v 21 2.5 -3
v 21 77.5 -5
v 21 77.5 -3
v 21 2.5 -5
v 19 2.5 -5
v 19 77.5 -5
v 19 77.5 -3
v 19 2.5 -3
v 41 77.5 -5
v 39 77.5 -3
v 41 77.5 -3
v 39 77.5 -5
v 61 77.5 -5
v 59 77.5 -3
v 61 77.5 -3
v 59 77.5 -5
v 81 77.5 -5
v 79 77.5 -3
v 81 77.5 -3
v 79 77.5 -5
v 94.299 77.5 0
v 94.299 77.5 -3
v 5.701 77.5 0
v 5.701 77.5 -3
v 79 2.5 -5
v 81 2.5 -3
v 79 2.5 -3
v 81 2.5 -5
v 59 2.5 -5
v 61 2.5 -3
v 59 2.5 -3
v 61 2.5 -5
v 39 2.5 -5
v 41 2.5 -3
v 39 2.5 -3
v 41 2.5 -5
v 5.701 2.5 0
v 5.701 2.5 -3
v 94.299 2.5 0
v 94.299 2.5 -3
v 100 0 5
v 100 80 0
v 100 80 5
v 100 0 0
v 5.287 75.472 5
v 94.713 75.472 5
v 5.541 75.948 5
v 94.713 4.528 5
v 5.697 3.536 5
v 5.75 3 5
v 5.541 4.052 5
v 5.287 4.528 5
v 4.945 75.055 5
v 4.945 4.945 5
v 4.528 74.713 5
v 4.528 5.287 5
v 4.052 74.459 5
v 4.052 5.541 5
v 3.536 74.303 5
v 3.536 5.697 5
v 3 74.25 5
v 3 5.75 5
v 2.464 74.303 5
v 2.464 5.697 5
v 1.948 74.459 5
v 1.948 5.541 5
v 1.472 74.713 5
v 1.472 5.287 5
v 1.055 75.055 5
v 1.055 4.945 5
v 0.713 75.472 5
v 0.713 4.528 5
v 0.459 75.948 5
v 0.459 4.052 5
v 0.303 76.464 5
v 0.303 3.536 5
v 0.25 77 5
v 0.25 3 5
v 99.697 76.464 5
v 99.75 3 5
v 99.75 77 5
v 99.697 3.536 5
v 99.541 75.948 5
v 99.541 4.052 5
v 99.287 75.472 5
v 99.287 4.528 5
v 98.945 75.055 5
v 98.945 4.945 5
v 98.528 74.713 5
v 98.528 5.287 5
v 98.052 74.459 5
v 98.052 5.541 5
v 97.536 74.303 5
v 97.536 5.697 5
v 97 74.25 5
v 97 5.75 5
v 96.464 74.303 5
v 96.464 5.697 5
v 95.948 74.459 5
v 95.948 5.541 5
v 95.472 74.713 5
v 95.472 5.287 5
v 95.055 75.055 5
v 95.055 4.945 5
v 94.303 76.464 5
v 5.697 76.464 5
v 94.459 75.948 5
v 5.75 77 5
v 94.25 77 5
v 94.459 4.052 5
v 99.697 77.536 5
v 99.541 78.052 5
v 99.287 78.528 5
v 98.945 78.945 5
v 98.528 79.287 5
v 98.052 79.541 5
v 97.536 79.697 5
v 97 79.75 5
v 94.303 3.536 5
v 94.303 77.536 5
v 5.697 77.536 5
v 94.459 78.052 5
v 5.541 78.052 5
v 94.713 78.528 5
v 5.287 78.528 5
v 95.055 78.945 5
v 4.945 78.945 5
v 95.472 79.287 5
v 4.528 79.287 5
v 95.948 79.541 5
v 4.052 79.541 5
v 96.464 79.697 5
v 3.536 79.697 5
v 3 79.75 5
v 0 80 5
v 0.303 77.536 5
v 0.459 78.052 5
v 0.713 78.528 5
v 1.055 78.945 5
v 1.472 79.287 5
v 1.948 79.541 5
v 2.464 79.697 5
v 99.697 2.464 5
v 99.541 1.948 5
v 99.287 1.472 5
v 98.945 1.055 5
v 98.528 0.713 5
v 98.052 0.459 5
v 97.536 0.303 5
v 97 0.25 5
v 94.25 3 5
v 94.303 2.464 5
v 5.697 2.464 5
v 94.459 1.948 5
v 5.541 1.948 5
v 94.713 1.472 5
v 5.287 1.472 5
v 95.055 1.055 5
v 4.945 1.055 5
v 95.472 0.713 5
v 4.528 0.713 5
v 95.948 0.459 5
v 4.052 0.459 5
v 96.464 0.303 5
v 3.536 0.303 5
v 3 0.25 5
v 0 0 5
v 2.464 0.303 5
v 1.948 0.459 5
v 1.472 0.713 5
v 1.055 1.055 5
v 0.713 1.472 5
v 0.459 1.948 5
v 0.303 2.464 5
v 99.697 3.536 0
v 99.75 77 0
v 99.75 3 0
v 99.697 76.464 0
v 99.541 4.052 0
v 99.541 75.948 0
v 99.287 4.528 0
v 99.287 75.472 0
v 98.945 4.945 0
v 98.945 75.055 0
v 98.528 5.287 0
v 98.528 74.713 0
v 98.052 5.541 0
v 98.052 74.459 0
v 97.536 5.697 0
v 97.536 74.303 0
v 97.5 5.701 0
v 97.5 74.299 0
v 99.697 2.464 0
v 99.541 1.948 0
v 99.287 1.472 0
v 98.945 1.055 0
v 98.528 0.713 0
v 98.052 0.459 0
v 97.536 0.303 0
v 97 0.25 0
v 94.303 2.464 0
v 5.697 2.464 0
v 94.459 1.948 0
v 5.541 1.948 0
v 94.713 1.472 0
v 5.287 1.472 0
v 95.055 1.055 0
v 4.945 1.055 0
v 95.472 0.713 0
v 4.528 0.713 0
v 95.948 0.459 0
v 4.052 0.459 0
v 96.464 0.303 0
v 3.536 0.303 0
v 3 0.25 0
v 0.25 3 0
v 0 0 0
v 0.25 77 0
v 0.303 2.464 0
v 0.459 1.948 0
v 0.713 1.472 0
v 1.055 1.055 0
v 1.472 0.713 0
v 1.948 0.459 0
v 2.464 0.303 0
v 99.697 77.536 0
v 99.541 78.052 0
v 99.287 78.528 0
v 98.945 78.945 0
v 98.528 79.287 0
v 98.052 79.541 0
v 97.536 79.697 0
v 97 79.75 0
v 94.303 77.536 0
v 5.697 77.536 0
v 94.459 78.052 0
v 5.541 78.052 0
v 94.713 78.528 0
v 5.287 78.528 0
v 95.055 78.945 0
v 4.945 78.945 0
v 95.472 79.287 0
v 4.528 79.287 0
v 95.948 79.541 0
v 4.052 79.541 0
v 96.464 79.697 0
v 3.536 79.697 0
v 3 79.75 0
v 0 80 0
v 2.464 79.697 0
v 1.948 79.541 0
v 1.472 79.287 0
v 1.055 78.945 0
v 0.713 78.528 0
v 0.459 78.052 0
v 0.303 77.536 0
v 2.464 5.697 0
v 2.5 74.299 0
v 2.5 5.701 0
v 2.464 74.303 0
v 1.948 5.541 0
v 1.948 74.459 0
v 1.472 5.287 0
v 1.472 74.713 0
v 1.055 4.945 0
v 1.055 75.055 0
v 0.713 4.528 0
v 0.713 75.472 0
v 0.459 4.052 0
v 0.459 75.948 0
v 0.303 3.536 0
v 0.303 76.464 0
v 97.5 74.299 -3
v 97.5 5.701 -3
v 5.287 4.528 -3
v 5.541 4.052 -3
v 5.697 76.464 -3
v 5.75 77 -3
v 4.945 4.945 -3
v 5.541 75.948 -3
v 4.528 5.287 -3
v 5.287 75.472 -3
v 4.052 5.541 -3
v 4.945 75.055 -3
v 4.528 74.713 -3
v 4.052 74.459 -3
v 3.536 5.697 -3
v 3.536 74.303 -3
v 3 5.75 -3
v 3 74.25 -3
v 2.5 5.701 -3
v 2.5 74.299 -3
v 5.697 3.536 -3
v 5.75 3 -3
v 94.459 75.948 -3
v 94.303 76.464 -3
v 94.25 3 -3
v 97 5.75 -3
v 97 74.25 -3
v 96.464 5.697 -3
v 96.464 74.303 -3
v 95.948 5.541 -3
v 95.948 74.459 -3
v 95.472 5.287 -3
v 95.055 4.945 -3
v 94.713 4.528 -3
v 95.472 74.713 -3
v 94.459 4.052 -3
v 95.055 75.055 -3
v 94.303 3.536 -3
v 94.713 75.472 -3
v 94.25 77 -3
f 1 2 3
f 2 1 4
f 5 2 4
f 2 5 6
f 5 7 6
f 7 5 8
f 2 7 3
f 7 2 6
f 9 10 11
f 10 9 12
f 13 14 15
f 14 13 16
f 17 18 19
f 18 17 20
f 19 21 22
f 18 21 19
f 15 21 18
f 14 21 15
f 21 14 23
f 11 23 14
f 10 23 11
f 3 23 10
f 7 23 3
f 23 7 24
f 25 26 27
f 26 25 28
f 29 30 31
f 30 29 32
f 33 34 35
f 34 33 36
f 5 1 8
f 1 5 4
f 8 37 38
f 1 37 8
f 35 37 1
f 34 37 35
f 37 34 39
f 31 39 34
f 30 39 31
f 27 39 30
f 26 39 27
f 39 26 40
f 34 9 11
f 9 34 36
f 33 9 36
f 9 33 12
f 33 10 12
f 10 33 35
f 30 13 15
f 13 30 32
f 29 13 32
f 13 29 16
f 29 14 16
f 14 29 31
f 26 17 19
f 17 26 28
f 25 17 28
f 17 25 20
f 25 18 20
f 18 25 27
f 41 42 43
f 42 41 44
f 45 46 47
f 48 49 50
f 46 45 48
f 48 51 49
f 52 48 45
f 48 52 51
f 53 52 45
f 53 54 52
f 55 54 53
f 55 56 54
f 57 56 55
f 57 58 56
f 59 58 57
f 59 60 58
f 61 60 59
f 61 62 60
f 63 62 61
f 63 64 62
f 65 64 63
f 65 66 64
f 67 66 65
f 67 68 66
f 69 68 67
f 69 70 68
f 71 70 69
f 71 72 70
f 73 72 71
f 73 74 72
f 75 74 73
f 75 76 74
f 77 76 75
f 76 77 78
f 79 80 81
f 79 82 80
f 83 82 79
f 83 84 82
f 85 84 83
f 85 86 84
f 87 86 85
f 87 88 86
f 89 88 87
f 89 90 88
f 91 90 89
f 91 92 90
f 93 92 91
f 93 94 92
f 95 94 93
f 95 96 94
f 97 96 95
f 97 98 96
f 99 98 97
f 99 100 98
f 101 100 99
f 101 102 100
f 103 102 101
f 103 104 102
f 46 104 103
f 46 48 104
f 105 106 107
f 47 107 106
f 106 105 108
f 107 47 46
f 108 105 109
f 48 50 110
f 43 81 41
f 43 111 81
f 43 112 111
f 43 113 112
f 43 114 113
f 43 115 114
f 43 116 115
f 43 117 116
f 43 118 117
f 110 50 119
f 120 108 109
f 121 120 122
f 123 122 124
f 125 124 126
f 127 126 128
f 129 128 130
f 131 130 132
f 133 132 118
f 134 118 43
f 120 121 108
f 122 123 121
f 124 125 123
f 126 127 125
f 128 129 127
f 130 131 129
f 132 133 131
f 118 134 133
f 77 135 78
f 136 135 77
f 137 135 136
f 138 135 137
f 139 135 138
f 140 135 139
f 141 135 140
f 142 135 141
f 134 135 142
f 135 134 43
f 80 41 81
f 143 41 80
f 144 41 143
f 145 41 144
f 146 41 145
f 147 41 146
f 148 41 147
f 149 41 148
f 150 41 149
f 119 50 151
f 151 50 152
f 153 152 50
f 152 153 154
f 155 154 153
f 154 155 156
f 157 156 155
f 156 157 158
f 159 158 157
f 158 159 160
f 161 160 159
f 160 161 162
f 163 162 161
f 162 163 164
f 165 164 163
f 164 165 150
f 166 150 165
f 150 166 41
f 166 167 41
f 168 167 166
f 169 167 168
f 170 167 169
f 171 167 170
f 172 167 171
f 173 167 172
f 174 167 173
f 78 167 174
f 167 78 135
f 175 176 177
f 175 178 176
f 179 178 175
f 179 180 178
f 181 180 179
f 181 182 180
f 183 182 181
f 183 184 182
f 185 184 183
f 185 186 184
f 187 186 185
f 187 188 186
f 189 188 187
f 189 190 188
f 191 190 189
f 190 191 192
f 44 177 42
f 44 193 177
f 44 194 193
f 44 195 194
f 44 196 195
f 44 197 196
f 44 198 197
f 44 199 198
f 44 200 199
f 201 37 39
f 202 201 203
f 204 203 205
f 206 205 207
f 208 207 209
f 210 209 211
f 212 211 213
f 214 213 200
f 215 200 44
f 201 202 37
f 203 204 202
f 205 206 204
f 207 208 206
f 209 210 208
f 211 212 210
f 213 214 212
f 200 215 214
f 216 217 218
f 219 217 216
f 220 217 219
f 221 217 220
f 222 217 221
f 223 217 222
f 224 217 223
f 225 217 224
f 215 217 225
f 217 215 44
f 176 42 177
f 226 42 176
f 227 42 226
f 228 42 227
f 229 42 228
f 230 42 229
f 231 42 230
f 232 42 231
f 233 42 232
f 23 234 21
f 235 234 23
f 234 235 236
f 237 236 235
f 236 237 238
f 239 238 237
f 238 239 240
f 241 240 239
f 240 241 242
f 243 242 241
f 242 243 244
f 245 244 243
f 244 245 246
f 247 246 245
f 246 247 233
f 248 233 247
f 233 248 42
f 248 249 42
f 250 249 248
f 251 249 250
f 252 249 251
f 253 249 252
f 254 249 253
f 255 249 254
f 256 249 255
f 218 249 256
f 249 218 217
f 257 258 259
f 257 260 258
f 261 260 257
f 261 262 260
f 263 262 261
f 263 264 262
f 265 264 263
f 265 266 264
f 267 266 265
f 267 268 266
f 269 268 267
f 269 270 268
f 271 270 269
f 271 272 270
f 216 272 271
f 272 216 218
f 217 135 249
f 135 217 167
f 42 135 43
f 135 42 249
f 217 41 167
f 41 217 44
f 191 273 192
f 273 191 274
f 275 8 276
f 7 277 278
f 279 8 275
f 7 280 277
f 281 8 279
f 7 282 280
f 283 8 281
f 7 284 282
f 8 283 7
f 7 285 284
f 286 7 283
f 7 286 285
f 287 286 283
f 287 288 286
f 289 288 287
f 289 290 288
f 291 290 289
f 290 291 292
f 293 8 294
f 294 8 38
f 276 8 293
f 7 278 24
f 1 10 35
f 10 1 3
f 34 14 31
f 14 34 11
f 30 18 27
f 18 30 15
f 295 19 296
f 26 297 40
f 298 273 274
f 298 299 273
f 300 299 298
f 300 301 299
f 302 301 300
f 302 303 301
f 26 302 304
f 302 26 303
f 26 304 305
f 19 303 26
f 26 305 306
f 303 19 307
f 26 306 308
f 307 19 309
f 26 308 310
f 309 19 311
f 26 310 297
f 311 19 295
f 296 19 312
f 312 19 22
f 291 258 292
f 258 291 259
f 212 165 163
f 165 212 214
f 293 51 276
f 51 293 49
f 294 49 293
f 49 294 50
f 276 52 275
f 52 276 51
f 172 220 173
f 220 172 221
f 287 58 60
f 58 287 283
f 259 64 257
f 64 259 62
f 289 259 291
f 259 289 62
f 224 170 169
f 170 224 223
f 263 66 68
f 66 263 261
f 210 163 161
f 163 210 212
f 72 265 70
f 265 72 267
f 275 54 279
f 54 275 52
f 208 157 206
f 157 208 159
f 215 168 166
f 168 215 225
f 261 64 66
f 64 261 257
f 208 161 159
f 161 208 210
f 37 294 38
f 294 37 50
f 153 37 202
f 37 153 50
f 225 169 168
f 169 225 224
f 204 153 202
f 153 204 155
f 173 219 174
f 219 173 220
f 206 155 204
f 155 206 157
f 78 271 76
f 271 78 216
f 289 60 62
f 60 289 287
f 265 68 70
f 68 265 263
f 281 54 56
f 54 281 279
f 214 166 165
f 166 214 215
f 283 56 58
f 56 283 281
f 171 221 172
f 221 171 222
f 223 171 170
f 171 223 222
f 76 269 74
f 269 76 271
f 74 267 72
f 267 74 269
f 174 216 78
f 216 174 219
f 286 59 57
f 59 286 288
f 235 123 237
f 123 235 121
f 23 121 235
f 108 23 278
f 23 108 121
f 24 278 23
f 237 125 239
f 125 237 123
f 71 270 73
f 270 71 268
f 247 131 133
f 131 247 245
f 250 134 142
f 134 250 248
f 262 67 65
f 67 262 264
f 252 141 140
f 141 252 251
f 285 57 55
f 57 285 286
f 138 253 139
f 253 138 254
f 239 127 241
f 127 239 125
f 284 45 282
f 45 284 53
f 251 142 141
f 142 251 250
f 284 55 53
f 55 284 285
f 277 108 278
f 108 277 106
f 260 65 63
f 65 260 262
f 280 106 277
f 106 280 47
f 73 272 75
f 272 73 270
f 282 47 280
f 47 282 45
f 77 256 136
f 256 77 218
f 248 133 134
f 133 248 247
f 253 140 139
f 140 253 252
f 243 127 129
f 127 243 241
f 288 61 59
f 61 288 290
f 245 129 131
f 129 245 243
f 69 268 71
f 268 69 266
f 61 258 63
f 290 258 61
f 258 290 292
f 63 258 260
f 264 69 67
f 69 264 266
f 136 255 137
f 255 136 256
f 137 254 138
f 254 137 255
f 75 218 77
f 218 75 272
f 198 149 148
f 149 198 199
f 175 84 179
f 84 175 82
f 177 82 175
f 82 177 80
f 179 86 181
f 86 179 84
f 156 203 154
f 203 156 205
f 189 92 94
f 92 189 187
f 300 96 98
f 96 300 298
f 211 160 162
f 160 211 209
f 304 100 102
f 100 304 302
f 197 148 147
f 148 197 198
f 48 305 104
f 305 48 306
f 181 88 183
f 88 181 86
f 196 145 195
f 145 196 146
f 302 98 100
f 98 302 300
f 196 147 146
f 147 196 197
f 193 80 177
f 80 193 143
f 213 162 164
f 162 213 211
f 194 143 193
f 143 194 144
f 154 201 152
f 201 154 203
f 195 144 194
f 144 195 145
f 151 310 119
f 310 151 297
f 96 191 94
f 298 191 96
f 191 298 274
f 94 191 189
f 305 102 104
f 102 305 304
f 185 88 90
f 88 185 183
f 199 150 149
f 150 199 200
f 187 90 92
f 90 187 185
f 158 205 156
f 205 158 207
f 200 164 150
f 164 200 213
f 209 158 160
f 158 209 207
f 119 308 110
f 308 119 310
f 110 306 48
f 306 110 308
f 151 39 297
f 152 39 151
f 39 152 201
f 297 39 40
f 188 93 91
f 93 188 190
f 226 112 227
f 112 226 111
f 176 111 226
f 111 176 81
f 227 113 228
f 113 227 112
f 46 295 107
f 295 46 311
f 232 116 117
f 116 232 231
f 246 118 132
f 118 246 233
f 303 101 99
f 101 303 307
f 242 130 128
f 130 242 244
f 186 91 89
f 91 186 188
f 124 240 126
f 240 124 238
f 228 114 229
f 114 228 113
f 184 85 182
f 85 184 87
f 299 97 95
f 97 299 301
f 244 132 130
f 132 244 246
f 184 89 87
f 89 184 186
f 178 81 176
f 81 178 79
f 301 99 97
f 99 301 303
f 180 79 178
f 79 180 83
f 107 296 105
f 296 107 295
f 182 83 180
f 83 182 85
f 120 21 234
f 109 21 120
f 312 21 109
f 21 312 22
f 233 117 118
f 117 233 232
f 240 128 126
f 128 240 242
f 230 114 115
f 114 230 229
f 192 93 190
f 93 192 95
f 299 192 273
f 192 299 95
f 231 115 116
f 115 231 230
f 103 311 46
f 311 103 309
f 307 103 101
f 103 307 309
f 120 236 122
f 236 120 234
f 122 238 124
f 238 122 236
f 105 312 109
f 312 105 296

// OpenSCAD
$fn = 32;

// ----------------------------------------------------------------------
// Enclosure lid: 100 x 80 x 5 mm, 4 bolt holes
// ----------------------------------------------------------------------

// --- parameters (mm) ---
length = 100;             // lid length, X
width = 80;               // lid width, Y
plate_t = 5;              // lid plate thickness
bolt_d = 5.5;             // bolt clearance
boss_lip = 3;             // bolt hole inset from the corner
sink = 1;                 // overlap of the lip and ribs into the plate
lip_h = 4;                // lip height below the plate
lip_wall = 2.5;           // lip wall thickness
rib_n = 4;                // stiffening ribs
rib_t = 2;                // rib thickness
rib_h = 6;                // rib height below the plate

module plate() {
  cube([length, width, plate_t]);
  /* lip that drops into the housing opening, sunk into the plate */
  translate([lip_wall, lip_wall, -lip_h + sink]) cube([length - 2 * lip_wall, width - 2 * lip_wall, lip_h]);
  /* stiffening ribs under the plate */
  for (i = [1 : rib_n]) translate([length * i / (rib_n + 1) - rib_t / 2, lip_wall, -rib_h + sink]) cube([rib_t, width - 2 * lip_wall, rib_h]);
}

difference() {
  plate();
  /* bolt pattern matching the corner bosses */
  for (sx = [0, 1]) for (sy = [0, 1])
    translate([sx * (length - 2 * boss_lip) + boss_lip, sy * (width - 2 * boss_lip) + boss_lip, -lip_h - 1])
      cylinder(h = plate_t + lip_h + 2, d = bolt_d);
}
